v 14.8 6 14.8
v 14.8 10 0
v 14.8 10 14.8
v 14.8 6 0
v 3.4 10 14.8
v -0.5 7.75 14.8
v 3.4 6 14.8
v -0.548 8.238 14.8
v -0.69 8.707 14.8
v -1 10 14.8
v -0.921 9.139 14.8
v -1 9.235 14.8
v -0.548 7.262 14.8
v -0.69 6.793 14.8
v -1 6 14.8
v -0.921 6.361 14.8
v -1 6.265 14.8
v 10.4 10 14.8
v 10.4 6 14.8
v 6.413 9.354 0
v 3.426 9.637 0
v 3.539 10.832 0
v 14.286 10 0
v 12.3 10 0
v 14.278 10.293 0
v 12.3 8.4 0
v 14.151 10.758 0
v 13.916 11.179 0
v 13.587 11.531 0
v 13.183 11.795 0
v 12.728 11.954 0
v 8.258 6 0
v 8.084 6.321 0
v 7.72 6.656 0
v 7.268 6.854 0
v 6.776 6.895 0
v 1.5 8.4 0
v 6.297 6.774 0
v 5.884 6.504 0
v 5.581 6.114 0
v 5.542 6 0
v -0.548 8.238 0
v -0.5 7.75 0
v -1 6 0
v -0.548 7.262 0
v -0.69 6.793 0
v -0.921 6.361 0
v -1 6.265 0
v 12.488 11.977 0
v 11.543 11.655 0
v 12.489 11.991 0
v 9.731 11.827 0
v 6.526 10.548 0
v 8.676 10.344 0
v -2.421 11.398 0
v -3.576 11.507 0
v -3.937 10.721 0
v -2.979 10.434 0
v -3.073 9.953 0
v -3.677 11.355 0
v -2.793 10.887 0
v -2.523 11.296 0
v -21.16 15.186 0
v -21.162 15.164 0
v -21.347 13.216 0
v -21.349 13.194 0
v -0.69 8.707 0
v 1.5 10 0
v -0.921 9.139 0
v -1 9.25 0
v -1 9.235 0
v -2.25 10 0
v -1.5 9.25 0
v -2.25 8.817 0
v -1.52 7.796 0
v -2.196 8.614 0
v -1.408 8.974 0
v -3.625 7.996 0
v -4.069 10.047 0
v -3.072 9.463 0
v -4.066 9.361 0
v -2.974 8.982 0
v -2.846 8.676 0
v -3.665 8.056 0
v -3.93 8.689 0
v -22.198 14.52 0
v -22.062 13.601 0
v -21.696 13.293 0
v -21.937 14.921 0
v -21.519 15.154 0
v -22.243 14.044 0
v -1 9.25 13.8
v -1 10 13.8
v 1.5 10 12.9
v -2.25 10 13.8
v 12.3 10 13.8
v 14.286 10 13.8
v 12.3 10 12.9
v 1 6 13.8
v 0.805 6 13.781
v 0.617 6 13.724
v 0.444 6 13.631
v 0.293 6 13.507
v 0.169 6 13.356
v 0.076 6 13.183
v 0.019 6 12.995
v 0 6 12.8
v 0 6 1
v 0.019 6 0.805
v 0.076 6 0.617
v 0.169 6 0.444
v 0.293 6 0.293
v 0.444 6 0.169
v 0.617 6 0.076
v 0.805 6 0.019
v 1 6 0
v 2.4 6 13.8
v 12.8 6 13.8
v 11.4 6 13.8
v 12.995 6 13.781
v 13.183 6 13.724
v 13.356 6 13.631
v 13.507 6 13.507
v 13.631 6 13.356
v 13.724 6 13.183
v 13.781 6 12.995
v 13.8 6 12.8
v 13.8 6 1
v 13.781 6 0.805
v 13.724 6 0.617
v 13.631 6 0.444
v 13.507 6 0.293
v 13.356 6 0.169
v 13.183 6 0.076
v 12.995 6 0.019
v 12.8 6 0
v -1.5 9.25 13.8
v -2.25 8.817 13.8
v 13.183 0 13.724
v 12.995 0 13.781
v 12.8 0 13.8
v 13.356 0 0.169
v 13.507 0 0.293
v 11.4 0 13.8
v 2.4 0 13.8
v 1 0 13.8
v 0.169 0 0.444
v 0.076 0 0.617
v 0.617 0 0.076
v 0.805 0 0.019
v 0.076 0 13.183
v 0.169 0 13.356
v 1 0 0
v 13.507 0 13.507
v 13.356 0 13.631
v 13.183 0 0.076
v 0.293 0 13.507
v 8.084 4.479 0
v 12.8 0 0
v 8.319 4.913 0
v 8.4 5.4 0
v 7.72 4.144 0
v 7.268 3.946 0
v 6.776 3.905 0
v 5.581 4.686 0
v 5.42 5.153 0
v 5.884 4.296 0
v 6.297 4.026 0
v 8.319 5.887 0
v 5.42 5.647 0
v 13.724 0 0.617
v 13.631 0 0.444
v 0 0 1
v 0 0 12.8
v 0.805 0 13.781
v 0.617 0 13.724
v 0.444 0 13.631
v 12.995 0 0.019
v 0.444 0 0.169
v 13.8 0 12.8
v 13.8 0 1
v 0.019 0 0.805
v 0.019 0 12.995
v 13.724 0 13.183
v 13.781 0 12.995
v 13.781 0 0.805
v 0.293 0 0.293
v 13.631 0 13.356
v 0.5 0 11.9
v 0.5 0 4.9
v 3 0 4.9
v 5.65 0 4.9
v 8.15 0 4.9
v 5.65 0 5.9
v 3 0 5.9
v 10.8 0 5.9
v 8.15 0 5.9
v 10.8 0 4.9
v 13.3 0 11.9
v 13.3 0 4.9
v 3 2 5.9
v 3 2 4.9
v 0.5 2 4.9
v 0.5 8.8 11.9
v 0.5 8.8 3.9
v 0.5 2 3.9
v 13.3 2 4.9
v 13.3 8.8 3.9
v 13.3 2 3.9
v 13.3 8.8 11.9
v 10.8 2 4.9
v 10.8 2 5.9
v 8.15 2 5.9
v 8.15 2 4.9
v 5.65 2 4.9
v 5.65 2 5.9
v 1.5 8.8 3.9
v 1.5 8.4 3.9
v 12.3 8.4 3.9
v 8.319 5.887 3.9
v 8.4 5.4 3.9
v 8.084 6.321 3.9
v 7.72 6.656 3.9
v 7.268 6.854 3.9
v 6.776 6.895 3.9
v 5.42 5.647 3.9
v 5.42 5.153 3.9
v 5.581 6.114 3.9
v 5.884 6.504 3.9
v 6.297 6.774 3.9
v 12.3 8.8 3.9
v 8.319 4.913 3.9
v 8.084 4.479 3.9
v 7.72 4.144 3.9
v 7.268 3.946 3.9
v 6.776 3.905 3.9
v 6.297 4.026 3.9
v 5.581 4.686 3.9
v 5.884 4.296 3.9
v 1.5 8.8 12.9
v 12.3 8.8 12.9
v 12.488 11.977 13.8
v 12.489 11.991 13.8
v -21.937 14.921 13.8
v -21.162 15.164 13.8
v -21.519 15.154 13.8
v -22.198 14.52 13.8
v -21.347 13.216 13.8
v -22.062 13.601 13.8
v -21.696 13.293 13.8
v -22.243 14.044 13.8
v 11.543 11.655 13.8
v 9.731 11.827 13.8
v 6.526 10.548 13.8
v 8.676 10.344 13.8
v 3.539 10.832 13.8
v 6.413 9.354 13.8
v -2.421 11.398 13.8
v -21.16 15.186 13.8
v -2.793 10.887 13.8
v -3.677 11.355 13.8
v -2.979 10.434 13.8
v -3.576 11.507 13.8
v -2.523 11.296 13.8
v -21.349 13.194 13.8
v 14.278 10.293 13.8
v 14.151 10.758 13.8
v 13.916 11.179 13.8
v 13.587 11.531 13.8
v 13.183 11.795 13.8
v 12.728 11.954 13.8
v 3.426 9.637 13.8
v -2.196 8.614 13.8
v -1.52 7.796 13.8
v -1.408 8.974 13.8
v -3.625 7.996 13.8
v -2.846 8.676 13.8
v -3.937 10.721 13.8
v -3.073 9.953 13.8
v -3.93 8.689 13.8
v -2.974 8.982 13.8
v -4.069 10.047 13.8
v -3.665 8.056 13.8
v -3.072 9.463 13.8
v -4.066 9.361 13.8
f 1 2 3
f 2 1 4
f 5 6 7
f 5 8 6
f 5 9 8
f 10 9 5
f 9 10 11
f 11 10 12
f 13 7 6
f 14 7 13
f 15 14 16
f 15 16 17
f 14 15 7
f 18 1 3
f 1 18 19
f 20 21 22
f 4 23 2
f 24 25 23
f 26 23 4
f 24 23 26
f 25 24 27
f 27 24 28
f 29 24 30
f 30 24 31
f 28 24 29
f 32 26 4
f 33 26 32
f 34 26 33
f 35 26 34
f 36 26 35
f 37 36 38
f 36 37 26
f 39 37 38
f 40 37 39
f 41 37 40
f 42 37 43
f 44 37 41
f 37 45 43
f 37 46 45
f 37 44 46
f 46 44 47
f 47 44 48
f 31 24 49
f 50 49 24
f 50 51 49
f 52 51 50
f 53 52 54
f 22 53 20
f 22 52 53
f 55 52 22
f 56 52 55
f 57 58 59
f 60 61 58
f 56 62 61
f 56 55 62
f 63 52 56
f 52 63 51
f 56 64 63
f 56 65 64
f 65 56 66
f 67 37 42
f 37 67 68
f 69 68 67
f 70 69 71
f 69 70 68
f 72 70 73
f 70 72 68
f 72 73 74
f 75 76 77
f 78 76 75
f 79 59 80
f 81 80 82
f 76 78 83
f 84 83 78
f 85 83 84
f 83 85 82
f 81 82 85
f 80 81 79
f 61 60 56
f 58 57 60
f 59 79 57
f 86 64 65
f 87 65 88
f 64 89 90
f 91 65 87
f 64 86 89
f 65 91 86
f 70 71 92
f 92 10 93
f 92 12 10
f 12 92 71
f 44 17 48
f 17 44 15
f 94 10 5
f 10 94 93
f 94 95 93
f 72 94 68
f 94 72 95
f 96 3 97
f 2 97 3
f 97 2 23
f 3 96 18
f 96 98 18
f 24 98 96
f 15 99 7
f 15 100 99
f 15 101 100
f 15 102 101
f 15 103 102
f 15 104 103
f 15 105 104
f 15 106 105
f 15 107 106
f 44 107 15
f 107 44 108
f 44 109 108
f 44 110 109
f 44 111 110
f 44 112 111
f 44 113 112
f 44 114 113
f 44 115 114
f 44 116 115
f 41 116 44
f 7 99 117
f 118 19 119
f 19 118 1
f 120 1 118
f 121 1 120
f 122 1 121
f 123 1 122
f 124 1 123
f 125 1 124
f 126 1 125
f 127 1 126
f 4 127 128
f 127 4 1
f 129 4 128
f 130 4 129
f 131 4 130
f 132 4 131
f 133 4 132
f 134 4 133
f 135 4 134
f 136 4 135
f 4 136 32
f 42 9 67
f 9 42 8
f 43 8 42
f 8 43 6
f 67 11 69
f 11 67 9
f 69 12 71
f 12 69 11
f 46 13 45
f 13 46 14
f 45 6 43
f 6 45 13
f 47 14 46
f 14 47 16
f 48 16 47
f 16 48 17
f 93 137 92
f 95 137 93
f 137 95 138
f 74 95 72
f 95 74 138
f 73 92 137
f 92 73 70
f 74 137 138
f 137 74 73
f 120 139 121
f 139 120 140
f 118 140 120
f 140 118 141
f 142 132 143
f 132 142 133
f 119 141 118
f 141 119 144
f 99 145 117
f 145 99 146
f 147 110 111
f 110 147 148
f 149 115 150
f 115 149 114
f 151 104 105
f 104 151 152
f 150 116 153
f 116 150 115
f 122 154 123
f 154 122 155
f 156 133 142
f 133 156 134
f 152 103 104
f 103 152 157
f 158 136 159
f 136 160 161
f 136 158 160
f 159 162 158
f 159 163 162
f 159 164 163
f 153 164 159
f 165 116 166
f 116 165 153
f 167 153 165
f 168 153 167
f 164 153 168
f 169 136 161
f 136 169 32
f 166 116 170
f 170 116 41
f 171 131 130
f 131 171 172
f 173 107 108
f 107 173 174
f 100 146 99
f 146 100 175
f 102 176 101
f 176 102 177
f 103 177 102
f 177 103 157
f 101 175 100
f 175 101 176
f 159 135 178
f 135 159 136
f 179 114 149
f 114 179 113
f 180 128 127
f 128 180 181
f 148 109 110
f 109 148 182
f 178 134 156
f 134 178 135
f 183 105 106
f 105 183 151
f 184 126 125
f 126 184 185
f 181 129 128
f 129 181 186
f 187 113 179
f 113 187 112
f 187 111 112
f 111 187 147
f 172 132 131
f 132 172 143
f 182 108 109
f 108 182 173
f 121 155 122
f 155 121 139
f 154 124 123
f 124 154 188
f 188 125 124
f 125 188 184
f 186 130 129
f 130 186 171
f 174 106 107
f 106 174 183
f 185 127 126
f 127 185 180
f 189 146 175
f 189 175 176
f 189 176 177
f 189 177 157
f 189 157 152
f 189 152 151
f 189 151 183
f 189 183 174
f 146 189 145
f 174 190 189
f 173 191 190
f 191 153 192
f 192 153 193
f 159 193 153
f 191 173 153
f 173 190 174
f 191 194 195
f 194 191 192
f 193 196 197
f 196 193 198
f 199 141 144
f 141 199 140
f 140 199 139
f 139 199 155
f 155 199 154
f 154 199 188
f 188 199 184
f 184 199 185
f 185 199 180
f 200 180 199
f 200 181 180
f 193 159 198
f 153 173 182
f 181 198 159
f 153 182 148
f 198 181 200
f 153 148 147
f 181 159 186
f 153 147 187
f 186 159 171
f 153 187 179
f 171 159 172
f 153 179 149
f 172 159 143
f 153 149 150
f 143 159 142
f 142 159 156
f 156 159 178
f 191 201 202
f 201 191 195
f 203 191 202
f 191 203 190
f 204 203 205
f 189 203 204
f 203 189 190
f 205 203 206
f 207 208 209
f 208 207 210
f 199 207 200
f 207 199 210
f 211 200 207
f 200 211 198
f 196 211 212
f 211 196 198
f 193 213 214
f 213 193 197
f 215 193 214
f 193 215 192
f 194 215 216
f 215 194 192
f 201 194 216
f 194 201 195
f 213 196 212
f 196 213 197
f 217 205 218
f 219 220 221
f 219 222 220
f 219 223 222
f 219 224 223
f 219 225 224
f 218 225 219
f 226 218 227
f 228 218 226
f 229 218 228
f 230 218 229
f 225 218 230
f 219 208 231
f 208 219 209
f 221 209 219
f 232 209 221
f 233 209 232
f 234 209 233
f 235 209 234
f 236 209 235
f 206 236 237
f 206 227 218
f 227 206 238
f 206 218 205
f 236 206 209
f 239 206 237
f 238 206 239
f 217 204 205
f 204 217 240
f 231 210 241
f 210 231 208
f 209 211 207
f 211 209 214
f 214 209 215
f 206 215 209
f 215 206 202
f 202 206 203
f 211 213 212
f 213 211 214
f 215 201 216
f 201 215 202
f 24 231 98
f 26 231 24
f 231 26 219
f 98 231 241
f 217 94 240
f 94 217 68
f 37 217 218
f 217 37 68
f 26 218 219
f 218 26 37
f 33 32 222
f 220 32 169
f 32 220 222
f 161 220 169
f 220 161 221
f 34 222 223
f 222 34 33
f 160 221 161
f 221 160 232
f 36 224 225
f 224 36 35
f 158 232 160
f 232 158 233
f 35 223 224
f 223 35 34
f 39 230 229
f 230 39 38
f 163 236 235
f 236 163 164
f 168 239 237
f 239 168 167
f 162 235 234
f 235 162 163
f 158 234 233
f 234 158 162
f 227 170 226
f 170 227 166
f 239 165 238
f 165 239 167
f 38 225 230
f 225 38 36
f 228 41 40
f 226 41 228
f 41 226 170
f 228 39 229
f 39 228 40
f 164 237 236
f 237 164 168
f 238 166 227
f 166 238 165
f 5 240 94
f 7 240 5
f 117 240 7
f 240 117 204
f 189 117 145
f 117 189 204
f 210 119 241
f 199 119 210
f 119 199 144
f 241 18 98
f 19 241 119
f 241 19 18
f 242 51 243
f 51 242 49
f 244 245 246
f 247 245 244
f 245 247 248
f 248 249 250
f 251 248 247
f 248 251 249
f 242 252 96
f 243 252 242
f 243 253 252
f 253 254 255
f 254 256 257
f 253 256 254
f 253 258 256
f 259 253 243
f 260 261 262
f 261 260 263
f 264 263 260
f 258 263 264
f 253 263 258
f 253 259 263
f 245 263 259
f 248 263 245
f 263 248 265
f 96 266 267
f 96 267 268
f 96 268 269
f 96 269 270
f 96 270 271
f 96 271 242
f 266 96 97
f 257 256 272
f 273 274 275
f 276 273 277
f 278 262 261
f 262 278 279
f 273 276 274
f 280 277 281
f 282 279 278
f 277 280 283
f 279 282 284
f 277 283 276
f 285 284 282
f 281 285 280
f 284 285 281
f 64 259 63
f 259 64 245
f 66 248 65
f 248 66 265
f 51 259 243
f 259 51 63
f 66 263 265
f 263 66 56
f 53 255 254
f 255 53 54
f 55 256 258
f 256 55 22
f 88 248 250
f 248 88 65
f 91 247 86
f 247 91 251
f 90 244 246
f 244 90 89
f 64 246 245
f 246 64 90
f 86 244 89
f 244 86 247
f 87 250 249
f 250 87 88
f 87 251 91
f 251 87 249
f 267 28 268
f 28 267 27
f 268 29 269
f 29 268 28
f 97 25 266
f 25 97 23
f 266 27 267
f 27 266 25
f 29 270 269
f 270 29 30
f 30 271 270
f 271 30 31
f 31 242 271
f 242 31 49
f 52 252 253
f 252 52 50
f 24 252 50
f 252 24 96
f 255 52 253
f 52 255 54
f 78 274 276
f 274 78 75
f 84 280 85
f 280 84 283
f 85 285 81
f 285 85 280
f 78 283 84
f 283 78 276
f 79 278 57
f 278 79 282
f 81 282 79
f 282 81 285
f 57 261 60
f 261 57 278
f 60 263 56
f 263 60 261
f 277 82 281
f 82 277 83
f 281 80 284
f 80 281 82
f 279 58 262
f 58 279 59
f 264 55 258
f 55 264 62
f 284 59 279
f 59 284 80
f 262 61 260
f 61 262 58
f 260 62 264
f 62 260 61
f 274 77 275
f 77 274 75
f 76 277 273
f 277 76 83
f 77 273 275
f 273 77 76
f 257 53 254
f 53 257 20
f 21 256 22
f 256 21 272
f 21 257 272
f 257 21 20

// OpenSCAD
use <../hardware/microswitch-cherry-mx.scad>

switch_carrier(20, 0);
